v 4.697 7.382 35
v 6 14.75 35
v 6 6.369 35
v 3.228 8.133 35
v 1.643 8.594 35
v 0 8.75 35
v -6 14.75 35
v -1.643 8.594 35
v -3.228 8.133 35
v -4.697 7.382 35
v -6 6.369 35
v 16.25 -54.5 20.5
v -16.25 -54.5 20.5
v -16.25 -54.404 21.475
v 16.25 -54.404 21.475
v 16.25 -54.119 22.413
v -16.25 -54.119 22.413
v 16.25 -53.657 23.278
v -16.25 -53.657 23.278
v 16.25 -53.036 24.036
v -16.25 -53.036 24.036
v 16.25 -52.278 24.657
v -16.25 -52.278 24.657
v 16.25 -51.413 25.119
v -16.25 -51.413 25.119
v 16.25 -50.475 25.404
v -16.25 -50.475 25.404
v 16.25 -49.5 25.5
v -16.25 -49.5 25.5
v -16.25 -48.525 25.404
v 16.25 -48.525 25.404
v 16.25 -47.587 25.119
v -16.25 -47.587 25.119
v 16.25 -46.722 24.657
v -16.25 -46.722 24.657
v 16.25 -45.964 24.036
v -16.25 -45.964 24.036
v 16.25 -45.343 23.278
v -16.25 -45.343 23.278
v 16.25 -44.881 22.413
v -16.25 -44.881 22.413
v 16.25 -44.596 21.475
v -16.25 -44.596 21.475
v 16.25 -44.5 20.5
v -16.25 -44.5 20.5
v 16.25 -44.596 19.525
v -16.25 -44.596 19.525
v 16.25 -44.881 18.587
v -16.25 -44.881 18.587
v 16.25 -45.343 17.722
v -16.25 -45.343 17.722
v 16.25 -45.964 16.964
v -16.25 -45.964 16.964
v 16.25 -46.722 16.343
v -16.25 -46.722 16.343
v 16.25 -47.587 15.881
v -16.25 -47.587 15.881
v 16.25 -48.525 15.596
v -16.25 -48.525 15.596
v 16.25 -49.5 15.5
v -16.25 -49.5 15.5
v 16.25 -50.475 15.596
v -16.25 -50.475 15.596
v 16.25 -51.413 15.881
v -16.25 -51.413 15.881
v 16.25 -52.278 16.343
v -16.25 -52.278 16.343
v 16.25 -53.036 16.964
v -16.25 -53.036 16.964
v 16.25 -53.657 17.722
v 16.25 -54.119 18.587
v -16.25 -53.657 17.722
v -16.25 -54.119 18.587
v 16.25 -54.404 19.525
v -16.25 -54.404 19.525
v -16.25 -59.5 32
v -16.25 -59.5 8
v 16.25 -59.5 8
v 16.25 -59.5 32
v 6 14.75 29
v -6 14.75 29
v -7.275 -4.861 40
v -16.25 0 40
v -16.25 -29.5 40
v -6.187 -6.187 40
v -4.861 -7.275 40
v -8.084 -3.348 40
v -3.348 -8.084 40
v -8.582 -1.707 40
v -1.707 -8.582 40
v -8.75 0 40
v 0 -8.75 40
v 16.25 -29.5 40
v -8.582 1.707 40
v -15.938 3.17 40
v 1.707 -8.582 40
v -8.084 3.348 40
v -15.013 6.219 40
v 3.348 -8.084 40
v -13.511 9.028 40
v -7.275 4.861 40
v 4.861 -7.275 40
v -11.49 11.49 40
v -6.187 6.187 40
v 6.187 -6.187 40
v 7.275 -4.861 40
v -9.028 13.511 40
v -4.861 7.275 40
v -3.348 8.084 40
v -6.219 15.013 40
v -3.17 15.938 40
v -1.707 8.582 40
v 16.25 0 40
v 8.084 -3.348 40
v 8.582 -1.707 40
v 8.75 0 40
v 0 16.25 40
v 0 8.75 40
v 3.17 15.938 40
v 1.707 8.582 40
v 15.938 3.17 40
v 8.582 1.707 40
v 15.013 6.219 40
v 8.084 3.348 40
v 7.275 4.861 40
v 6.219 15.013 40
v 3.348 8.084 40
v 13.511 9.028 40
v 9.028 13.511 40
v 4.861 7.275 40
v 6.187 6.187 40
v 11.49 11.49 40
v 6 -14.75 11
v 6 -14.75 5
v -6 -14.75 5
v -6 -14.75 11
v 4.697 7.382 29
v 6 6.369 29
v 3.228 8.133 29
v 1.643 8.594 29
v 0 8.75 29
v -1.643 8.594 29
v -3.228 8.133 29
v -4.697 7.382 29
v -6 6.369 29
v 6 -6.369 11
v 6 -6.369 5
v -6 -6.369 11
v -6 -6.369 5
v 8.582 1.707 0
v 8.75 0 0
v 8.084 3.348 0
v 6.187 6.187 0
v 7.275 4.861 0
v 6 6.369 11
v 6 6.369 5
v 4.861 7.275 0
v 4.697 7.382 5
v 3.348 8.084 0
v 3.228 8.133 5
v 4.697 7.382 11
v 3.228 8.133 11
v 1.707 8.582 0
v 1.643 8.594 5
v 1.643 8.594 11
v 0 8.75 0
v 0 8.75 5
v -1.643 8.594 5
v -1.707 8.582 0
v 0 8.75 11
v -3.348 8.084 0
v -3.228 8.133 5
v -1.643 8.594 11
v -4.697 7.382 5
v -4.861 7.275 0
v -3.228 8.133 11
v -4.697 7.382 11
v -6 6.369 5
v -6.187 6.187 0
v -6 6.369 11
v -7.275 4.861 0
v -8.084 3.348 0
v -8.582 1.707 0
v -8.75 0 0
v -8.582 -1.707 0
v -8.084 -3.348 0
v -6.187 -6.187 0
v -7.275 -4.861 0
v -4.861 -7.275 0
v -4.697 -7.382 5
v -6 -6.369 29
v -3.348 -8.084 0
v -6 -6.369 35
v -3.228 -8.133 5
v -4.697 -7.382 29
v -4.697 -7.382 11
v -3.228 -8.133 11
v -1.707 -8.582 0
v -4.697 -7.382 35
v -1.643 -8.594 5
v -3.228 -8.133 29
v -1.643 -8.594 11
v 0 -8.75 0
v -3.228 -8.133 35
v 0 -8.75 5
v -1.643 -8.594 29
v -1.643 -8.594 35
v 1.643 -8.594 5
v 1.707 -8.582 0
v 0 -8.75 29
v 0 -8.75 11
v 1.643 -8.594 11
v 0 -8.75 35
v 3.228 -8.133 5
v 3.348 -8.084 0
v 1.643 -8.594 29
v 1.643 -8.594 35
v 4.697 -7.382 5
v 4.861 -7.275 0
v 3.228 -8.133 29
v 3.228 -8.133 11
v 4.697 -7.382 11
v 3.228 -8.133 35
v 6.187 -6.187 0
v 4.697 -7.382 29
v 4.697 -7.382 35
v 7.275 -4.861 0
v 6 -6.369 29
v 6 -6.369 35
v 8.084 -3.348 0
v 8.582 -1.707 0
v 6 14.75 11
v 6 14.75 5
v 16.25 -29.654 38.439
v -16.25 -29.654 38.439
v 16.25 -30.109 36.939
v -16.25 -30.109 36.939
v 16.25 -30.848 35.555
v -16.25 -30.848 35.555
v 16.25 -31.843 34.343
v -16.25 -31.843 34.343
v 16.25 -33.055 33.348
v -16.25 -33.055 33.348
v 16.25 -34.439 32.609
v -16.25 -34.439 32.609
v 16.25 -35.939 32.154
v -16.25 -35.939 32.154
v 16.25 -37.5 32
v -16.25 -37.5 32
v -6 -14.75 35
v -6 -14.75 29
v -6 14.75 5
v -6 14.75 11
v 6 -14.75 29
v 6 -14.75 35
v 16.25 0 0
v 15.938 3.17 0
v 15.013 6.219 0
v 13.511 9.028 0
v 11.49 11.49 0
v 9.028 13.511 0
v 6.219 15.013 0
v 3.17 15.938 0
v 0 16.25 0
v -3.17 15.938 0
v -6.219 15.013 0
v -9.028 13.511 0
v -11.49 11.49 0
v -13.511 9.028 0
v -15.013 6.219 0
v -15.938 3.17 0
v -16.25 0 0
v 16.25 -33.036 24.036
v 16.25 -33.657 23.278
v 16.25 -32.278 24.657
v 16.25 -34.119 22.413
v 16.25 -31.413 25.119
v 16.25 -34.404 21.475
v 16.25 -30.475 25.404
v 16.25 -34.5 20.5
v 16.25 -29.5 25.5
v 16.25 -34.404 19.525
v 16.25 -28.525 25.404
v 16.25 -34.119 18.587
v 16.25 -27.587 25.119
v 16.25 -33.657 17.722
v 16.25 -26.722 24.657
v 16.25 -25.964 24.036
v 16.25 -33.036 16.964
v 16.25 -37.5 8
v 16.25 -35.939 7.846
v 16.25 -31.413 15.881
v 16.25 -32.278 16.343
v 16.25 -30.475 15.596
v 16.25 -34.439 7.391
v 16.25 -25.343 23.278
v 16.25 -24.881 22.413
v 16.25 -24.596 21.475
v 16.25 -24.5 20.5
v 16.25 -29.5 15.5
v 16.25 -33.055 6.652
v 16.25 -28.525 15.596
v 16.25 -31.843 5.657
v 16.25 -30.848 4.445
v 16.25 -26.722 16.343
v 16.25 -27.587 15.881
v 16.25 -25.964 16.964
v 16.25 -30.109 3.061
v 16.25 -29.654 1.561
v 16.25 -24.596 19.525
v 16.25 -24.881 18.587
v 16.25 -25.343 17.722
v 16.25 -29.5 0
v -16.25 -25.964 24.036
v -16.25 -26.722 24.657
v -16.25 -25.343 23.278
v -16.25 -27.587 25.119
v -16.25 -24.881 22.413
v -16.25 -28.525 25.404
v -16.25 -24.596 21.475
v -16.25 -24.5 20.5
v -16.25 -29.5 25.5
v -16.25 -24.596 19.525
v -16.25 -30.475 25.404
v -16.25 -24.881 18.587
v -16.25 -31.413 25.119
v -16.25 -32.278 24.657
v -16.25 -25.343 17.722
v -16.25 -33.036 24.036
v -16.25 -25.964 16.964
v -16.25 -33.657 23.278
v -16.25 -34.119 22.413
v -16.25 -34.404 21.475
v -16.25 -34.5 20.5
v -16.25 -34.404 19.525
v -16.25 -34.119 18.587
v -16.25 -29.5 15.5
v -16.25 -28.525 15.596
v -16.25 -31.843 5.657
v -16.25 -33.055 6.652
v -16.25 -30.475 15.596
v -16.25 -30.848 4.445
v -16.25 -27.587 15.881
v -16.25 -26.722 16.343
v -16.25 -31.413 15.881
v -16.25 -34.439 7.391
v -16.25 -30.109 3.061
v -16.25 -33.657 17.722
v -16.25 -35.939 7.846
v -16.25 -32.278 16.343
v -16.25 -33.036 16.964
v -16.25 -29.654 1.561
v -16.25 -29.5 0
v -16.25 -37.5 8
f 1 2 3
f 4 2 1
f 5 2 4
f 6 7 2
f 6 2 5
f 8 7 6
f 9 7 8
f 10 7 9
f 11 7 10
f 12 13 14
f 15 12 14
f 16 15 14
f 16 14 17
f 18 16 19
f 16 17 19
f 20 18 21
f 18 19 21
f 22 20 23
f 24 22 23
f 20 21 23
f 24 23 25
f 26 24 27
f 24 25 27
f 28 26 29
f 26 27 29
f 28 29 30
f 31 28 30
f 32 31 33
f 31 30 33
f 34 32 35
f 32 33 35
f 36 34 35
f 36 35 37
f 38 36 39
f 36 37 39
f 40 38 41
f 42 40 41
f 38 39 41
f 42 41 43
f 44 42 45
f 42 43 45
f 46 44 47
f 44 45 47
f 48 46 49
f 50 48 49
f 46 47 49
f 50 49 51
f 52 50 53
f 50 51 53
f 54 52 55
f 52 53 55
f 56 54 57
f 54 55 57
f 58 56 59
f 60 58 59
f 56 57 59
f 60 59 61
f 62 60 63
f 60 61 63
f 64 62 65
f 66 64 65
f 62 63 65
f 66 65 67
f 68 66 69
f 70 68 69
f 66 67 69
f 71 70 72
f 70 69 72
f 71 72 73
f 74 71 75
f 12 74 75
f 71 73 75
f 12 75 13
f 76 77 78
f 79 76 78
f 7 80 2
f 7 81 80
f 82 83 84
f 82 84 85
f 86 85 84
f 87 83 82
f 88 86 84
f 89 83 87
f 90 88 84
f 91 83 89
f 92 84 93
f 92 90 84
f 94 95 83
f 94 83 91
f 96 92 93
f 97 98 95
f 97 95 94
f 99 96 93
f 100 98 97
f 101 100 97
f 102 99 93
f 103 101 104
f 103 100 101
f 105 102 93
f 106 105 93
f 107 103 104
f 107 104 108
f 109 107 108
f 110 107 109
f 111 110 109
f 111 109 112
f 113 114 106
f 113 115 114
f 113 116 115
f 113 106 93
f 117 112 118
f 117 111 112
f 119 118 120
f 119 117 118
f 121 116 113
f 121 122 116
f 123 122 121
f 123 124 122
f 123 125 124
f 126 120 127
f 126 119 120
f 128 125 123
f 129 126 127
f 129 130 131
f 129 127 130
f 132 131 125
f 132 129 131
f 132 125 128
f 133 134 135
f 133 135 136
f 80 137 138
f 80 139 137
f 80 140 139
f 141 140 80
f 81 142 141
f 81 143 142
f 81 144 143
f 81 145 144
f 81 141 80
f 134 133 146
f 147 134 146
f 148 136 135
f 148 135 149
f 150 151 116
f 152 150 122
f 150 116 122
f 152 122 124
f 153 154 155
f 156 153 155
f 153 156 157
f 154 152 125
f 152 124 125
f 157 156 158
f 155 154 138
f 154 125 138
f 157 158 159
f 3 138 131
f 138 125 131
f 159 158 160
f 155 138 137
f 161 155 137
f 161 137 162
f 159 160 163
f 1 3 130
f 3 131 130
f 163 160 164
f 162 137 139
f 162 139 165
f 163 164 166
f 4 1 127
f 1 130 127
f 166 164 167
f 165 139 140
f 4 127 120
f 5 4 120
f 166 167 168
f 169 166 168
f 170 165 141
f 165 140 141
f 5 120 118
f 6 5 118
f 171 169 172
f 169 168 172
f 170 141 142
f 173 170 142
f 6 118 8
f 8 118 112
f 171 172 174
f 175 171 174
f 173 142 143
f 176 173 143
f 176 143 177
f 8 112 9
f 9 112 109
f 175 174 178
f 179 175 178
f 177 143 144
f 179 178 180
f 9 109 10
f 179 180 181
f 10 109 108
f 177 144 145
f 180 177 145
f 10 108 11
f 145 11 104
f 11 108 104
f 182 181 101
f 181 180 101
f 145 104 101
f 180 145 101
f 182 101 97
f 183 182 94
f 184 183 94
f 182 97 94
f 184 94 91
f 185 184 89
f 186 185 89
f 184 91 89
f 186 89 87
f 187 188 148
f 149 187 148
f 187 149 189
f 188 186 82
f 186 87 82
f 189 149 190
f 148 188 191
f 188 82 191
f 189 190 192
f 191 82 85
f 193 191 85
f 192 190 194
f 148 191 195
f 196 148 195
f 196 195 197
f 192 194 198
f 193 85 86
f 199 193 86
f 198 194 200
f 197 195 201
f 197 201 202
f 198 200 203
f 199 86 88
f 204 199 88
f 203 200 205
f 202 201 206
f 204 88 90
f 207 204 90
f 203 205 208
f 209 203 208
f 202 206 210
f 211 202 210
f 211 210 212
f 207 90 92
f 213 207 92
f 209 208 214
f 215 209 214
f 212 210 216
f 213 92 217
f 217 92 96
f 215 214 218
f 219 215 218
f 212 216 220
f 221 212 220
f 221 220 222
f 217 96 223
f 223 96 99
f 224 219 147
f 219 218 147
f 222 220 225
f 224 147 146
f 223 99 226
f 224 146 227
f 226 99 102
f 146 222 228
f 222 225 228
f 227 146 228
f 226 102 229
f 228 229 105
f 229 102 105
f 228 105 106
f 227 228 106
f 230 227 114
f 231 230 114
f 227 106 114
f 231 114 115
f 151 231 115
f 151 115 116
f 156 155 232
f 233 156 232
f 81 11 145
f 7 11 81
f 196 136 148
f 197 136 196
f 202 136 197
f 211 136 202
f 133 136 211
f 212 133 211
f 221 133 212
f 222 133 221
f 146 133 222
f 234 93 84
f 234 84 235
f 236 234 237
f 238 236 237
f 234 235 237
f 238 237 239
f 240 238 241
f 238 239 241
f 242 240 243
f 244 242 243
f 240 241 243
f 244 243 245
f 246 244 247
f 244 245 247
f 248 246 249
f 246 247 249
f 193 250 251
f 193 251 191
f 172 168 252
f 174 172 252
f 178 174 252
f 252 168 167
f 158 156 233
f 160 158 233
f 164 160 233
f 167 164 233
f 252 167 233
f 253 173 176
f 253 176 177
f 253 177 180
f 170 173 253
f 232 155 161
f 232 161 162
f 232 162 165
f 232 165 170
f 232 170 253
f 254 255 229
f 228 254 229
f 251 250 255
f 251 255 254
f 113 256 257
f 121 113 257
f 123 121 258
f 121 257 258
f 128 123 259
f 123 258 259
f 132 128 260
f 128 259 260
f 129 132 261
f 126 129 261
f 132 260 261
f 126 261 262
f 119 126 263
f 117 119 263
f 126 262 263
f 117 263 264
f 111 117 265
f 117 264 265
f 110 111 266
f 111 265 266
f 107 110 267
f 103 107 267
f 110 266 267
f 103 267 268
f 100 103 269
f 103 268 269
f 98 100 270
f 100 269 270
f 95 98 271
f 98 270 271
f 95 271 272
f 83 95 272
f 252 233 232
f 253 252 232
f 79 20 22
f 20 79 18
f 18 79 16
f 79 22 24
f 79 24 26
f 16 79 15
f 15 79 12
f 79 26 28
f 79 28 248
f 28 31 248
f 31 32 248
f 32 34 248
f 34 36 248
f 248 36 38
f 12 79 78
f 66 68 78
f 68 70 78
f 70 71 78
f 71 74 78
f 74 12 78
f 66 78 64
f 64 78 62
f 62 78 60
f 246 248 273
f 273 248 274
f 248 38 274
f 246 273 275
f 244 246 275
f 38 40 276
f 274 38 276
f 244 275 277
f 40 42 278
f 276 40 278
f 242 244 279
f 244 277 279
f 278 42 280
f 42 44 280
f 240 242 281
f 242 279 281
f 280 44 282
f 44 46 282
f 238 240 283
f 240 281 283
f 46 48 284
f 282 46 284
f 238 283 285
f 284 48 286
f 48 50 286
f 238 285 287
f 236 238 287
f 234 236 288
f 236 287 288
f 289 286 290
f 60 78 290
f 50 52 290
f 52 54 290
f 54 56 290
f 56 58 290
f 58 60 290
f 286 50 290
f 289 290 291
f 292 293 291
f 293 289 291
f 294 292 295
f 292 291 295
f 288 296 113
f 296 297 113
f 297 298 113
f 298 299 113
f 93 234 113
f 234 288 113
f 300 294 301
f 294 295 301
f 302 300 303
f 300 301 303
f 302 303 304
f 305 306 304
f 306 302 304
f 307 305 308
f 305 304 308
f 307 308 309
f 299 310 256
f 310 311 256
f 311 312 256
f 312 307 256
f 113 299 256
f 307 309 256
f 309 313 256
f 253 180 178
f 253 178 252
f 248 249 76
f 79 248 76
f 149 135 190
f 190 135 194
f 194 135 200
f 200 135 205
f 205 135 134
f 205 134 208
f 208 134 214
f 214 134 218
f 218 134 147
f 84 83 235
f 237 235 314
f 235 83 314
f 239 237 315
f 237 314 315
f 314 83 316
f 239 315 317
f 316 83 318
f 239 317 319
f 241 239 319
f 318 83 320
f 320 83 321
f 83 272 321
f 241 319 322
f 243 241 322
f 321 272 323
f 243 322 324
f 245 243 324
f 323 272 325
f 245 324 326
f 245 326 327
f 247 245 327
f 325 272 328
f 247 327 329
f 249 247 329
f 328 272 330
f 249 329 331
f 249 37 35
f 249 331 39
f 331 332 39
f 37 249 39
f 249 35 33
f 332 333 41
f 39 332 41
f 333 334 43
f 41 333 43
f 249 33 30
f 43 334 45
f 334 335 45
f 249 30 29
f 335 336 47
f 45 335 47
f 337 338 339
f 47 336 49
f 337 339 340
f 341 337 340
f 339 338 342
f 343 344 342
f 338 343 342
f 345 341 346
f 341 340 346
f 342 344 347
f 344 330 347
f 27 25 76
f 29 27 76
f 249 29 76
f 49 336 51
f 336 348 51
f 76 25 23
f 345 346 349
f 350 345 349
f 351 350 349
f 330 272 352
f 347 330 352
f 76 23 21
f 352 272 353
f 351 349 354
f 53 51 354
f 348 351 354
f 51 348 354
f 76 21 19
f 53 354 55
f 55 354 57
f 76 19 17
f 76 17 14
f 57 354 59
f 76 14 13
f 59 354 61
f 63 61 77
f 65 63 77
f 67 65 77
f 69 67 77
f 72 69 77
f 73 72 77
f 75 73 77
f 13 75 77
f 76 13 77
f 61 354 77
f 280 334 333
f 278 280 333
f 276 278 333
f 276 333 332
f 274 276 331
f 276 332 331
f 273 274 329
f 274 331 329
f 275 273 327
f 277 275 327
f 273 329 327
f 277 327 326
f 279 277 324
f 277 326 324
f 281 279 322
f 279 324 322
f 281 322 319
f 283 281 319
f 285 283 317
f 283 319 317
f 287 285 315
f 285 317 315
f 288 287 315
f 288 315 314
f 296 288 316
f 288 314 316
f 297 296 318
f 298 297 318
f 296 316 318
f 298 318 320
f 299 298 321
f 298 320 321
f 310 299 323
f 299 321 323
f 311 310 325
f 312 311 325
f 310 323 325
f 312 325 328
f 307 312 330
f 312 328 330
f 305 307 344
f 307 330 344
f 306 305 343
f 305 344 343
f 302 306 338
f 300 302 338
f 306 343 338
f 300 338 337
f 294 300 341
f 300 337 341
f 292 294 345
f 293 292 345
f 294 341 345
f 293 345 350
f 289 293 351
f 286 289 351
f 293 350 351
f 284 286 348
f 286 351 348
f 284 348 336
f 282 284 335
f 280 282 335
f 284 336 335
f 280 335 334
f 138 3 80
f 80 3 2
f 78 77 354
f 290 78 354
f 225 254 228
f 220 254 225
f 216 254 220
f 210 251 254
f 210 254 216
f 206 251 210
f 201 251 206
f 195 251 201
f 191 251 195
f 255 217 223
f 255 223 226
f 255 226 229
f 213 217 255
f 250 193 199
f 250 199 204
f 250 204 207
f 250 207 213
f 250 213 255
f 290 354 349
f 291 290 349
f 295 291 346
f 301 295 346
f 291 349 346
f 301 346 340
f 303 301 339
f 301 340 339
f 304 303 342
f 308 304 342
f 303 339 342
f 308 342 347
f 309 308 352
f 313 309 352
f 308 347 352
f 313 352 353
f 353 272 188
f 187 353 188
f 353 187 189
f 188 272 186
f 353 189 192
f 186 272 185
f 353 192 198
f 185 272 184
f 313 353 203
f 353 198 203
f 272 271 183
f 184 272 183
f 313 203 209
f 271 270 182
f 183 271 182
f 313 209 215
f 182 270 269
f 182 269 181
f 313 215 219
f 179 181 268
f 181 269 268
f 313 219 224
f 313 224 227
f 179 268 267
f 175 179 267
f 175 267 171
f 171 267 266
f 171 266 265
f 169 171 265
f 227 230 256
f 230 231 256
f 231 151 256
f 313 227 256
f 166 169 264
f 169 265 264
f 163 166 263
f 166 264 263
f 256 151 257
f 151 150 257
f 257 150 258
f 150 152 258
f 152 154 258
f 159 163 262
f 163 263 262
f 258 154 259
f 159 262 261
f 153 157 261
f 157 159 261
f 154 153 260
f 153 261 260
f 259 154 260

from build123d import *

# Parameters (mm, degrees)
F0_W     = 32.5
F0_H     = 30
F1_DEPTH = 40
F2_R     = 5
F3_DEPTH = 32.5
F4_R     = 8.75
F5_DEPTH = 40
F6_W     = 29.5
F6_H     = 6
F7_DEPTH = 6


with BuildPart() as f1:
    # F0 (on Top) → F1 (new body)
    with BuildSketch(Plane.XY):
        with BuildLine():
            Line((16.25, -29.5), (16.25, 0))
            ThreePointArc((16.25, 0), (0, 16.25), (-16.25, 0))
            Line((-16.25, 0), (-16.25, -29.5))
            Line((-16.25, -29.5), (16.25, -29.5))
        make_face()
        with Locations((0, -44.5)):
            Rectangle(F0_W, F0_H)
    extrude(amount=F1_DEPTH)

    # F2 (on face) → F3 (cut)
    with BuildSketch(Plane(origin=(-16.25, 0, 0), x_dir=(0, -1, 0), z_dir=(-1, 0, 0))):
        with BuildLine():
            Line((37.5, 32), (59.5, 32))
            Line((59.5, 32), (59.5, 40))
            Line((59.5, 40), (29.5, 40))
            ThreePointArc((29.5, 40), (31.843146, 34.343146), (37.5, 32))
        make_face()
        with BuildLine():
            Line((29.5, 0), (59.5, 0))
            Line((59.5, 0), (59.5, 8))
            Line((59.5, 8), (37.5, 8))
            ThreePointArc((37.5, 8), (31.843146, 5.656854), (29.5, 0))
        make_face()
        with Locations((29.5, 20.5)):
            Circle(F2_R)
        with Locations((49.5, 20.5)):
            Circle(F2_R)
    extrude(amount=-F3_DEPTH, mode=Mode.SUBTRACT)

    # F4 (on face) → F5 (cut)
    with BuildSketch(Plane.XY.offset(40)):
        Circle(F4_R)
    extrude(amount=-F5_DEPTH, mode=Mode.SUBTRACT)

    # F6 (on Right) → F7 (cut, symmetric)
    with BuildSketch(Plane.YZ):
        Polygon((-14.75, 29), (14.75, 29), (14.75, 35), (0, 35), (-14.75, 35), align=None)
        with Locations((0, 8)):
            Rectangle(F6_W, F6_H)
    extrude(amount=F7_DEPTH, both=True, mode=Mode.SUBTRACT)


solid = f1.part
